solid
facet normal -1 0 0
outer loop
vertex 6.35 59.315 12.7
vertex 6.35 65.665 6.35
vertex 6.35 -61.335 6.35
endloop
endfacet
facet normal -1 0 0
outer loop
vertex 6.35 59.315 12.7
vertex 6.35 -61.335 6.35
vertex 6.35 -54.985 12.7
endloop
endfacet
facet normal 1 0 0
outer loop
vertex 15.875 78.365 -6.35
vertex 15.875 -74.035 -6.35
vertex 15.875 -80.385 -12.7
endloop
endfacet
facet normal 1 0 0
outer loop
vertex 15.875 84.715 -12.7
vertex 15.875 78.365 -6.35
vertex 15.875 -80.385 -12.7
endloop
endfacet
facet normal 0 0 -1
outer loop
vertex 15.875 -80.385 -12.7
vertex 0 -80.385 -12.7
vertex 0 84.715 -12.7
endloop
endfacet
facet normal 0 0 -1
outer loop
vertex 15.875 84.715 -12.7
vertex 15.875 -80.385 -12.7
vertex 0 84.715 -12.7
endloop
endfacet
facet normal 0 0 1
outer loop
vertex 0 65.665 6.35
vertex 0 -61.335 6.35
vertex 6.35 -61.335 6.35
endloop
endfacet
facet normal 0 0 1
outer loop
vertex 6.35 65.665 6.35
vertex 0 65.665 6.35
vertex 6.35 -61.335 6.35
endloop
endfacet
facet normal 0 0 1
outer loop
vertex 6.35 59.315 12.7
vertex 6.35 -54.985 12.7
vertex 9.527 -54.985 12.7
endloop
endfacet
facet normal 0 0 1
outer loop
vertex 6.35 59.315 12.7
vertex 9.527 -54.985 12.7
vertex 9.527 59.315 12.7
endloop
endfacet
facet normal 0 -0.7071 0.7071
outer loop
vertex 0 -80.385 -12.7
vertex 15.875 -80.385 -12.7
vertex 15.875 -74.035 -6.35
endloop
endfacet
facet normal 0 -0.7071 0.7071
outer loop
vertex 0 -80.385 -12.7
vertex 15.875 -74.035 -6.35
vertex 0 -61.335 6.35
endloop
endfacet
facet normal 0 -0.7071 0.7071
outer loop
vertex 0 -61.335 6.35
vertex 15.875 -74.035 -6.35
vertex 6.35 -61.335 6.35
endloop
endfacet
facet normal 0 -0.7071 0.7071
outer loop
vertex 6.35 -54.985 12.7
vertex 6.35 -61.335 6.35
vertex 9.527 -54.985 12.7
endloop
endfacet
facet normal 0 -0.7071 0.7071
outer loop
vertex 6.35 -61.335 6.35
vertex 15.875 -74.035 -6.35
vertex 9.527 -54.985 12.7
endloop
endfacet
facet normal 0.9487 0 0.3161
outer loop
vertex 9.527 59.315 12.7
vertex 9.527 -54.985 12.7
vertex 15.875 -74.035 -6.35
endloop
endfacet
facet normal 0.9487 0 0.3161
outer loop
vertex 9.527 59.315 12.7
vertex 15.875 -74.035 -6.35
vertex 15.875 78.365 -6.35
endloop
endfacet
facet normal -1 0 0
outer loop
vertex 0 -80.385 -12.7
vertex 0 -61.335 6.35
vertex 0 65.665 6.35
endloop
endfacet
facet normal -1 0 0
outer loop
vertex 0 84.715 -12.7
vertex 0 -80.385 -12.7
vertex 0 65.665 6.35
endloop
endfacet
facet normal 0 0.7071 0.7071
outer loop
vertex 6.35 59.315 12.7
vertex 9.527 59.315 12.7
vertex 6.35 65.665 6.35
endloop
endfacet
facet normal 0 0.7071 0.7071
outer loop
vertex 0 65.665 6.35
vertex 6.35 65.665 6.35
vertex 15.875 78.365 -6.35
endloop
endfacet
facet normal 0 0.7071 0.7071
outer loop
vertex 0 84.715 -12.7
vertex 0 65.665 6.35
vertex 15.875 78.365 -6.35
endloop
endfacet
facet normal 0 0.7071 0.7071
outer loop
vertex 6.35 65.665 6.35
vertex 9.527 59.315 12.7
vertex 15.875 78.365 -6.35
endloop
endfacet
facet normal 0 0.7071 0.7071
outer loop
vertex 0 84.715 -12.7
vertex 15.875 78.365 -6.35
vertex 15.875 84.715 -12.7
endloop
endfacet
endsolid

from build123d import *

# Parameters (mm, degrees)
F0_W     = 165.1
F0_H     = 25.4
F1_DEPTH = 15.875
F3_W     = 6.35
F3_H     = 6.35
F4_DEPTH = 165.101
F5_DEPTH = 15.876
F6_SIZE2 = 6.348172
F6_SIZE  = 19.05


with BuildPart() as f1:
    # F0 (on Right) → F1 (new body)
    with BuildSketch(Plane.YZ):
        with Locations((2.164774, 0)):
            Rectangle(F0_W, F0_H)
    extrude(amount=F1_DEPTH)

    # F3 (on face) → F4 (cut, through all)
    with BuildSketch(Plane.XZ.offset(80.385226)):
        with Locations((3.175, 9.525)):
            Rectangle(F3_W, F3_H)
    extrude(amount=-F4_DEPTH, mode=Mode.SUBTRACT)

    # F2 (on face) → F5 (cut, through all)
    with BuildSketch(Plane.YZ.offset(15.875)):
        Polygon((-80.385226, 12.7), (-80.385226, -12.7), (-54.985226, 12.7), align=None)
        Polygon((59.314774, 12.7), (84.714774, -12.7), (84.714774, 12.7), align=None)
    extrude(amount=-F5_DEPTH, mode=Mode.SUBTRACT)

    # F6
    f6_edges = [f1.edges().sort_by_distance(p)[0] for p in [
        (15.875, 2.164774, 12.7),
    ]]
    chamfer(f6_edges, length=F6_SIZE, length2=F6_SIZE2)


solid = f1.part
